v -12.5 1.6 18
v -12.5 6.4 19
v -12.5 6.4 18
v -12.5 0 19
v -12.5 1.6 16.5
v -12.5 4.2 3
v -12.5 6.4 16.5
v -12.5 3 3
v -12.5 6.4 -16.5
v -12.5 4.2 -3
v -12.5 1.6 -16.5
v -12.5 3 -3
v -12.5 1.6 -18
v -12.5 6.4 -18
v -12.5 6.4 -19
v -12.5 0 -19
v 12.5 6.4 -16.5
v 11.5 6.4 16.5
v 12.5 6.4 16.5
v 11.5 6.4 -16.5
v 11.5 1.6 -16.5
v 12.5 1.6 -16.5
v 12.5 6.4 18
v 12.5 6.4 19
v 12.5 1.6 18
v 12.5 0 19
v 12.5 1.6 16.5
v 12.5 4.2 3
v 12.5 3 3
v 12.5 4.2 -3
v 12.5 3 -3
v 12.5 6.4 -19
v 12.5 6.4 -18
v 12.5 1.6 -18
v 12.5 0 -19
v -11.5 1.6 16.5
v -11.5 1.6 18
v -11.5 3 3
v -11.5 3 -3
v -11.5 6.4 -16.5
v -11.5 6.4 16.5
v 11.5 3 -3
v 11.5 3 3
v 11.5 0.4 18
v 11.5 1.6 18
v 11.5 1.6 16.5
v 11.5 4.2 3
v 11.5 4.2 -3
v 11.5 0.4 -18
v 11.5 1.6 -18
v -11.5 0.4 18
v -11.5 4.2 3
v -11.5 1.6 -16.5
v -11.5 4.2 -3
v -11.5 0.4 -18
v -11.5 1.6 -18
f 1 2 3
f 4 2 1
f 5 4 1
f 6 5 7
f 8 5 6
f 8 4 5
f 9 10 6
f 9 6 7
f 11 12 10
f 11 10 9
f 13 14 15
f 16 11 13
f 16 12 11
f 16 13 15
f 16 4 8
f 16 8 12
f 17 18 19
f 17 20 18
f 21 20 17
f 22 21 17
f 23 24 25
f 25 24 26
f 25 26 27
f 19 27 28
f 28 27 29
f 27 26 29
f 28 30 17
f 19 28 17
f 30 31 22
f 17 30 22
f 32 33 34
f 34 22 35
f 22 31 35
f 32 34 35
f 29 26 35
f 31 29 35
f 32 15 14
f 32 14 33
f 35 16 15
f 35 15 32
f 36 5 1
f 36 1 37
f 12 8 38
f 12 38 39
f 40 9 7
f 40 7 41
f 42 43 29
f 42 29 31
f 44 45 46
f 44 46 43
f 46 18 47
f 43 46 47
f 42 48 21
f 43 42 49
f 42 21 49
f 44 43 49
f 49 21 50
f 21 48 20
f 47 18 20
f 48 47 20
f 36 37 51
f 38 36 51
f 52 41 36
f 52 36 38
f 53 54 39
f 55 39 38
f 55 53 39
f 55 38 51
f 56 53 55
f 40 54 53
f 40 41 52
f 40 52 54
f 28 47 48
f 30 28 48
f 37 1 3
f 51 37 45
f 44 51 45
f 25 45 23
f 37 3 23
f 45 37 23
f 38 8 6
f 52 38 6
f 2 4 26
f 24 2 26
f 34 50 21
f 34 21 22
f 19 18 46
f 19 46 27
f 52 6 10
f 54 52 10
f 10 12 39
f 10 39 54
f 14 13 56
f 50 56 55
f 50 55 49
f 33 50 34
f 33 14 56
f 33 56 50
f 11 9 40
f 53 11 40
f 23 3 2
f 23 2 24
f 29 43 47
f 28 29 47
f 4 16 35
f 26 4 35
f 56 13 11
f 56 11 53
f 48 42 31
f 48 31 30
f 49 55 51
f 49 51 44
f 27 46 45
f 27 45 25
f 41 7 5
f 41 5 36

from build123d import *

# Parameters (mm, degrees)
SKETCH1_W               = 25
SKETCH1_H               = 38
BOSS_EXTRUDE1_DEPTH     = 6.4
CUT_EXTRUDE1_DEPTH      = 6
SKETCH2_3_W             = 1
SKETCH2_3_H             = 1.5
CUT_EXTRUDE2_DEPTH      = 4.8
CUT_EXTRUDE3_DEPTH      = 24.626468208
CUT_EXTRUDE3_DEPTH_BACK = 24.626468208
SKETCH3_W               = 6
SKETCH3_H               = 1.2


with BuildPart() as part:
    # Sketch1 → Boss-Extrude1 (new body)
    with BuildSketch(Plane(origin=(0, 0, 0), x_dir=(1, 0, 0), z_dir=(0, 1, 0))):
        Rectangle(SKETCH1_W, SKETCH1_H)
    extrude(amount=BOSS_EXTRUDE1_DEPTH)

    # Sketch2 → Cut-Extrude1 (cut)
    with BuildSketch(Plane(origin=(0, 6.4, 0), x_dir=(1, 0, 0), z_dir=(0, 1, 0))):
        Polygon((-11.5, -16.5), (-11.5, -18), (11.5, -18), (11.5, -16.5), (11.5, 16.5), (11.5, 18), (-11.5, 18), (-11.5, 16.5), align=None)
    extrude(amount=-CUT_EXTRUDE1_DEPTH, mode=Mode.SUBTRACT)

    # Sketch2<3> → Cut-Extrude2 (cut)
    with BuildSketch(Plane(origin=(0, 6.4, 0), x_dir=(1, 0, 0), z_dir=(0, 1, 0))):
        with Locations((-12, -17.25)):
            Rectangle(SKETCH2_3_W, SKETCH2_3_H)
        with Locations((12, -17.25)):
            Rectangle(SKETCH2_3_W, SKETCH2_3_H)
        with Locations((-12, 17.25)):
            Rectangle(SKETCH2_3_W, SKETCH2_3_H)
        with Locations((12, 17.25)):
            Rectangle(SKETCH2_3_W, SKETCH2_3_H)
    extrude(amount=-CUT_EXTRUDE2_DEPTH, mode=Mode.SUBTRACT)

    # Sketch3 → Cut-Extrude3 (cut, two sides: drawn at the far end of the back side and taken through both)
    with BuildSketch(Plane(origin=(0, 0, 0), x_dir=(0, 0, -1), z_dir=(1, 0, 0)).offset(-CUT_EXTRUDE3_DEPTH_BACK)):
        with Locations((0, 3.6)):
            Rectangle(SKETCH3_W, SKETCH3_H)
    extrude(amount=CUT_EXTRUDE3_DEPTH + CUT_EXTRUDE3_DEPTH_BACK, mode=Mode.SUBTRACT)


solid = part.part
